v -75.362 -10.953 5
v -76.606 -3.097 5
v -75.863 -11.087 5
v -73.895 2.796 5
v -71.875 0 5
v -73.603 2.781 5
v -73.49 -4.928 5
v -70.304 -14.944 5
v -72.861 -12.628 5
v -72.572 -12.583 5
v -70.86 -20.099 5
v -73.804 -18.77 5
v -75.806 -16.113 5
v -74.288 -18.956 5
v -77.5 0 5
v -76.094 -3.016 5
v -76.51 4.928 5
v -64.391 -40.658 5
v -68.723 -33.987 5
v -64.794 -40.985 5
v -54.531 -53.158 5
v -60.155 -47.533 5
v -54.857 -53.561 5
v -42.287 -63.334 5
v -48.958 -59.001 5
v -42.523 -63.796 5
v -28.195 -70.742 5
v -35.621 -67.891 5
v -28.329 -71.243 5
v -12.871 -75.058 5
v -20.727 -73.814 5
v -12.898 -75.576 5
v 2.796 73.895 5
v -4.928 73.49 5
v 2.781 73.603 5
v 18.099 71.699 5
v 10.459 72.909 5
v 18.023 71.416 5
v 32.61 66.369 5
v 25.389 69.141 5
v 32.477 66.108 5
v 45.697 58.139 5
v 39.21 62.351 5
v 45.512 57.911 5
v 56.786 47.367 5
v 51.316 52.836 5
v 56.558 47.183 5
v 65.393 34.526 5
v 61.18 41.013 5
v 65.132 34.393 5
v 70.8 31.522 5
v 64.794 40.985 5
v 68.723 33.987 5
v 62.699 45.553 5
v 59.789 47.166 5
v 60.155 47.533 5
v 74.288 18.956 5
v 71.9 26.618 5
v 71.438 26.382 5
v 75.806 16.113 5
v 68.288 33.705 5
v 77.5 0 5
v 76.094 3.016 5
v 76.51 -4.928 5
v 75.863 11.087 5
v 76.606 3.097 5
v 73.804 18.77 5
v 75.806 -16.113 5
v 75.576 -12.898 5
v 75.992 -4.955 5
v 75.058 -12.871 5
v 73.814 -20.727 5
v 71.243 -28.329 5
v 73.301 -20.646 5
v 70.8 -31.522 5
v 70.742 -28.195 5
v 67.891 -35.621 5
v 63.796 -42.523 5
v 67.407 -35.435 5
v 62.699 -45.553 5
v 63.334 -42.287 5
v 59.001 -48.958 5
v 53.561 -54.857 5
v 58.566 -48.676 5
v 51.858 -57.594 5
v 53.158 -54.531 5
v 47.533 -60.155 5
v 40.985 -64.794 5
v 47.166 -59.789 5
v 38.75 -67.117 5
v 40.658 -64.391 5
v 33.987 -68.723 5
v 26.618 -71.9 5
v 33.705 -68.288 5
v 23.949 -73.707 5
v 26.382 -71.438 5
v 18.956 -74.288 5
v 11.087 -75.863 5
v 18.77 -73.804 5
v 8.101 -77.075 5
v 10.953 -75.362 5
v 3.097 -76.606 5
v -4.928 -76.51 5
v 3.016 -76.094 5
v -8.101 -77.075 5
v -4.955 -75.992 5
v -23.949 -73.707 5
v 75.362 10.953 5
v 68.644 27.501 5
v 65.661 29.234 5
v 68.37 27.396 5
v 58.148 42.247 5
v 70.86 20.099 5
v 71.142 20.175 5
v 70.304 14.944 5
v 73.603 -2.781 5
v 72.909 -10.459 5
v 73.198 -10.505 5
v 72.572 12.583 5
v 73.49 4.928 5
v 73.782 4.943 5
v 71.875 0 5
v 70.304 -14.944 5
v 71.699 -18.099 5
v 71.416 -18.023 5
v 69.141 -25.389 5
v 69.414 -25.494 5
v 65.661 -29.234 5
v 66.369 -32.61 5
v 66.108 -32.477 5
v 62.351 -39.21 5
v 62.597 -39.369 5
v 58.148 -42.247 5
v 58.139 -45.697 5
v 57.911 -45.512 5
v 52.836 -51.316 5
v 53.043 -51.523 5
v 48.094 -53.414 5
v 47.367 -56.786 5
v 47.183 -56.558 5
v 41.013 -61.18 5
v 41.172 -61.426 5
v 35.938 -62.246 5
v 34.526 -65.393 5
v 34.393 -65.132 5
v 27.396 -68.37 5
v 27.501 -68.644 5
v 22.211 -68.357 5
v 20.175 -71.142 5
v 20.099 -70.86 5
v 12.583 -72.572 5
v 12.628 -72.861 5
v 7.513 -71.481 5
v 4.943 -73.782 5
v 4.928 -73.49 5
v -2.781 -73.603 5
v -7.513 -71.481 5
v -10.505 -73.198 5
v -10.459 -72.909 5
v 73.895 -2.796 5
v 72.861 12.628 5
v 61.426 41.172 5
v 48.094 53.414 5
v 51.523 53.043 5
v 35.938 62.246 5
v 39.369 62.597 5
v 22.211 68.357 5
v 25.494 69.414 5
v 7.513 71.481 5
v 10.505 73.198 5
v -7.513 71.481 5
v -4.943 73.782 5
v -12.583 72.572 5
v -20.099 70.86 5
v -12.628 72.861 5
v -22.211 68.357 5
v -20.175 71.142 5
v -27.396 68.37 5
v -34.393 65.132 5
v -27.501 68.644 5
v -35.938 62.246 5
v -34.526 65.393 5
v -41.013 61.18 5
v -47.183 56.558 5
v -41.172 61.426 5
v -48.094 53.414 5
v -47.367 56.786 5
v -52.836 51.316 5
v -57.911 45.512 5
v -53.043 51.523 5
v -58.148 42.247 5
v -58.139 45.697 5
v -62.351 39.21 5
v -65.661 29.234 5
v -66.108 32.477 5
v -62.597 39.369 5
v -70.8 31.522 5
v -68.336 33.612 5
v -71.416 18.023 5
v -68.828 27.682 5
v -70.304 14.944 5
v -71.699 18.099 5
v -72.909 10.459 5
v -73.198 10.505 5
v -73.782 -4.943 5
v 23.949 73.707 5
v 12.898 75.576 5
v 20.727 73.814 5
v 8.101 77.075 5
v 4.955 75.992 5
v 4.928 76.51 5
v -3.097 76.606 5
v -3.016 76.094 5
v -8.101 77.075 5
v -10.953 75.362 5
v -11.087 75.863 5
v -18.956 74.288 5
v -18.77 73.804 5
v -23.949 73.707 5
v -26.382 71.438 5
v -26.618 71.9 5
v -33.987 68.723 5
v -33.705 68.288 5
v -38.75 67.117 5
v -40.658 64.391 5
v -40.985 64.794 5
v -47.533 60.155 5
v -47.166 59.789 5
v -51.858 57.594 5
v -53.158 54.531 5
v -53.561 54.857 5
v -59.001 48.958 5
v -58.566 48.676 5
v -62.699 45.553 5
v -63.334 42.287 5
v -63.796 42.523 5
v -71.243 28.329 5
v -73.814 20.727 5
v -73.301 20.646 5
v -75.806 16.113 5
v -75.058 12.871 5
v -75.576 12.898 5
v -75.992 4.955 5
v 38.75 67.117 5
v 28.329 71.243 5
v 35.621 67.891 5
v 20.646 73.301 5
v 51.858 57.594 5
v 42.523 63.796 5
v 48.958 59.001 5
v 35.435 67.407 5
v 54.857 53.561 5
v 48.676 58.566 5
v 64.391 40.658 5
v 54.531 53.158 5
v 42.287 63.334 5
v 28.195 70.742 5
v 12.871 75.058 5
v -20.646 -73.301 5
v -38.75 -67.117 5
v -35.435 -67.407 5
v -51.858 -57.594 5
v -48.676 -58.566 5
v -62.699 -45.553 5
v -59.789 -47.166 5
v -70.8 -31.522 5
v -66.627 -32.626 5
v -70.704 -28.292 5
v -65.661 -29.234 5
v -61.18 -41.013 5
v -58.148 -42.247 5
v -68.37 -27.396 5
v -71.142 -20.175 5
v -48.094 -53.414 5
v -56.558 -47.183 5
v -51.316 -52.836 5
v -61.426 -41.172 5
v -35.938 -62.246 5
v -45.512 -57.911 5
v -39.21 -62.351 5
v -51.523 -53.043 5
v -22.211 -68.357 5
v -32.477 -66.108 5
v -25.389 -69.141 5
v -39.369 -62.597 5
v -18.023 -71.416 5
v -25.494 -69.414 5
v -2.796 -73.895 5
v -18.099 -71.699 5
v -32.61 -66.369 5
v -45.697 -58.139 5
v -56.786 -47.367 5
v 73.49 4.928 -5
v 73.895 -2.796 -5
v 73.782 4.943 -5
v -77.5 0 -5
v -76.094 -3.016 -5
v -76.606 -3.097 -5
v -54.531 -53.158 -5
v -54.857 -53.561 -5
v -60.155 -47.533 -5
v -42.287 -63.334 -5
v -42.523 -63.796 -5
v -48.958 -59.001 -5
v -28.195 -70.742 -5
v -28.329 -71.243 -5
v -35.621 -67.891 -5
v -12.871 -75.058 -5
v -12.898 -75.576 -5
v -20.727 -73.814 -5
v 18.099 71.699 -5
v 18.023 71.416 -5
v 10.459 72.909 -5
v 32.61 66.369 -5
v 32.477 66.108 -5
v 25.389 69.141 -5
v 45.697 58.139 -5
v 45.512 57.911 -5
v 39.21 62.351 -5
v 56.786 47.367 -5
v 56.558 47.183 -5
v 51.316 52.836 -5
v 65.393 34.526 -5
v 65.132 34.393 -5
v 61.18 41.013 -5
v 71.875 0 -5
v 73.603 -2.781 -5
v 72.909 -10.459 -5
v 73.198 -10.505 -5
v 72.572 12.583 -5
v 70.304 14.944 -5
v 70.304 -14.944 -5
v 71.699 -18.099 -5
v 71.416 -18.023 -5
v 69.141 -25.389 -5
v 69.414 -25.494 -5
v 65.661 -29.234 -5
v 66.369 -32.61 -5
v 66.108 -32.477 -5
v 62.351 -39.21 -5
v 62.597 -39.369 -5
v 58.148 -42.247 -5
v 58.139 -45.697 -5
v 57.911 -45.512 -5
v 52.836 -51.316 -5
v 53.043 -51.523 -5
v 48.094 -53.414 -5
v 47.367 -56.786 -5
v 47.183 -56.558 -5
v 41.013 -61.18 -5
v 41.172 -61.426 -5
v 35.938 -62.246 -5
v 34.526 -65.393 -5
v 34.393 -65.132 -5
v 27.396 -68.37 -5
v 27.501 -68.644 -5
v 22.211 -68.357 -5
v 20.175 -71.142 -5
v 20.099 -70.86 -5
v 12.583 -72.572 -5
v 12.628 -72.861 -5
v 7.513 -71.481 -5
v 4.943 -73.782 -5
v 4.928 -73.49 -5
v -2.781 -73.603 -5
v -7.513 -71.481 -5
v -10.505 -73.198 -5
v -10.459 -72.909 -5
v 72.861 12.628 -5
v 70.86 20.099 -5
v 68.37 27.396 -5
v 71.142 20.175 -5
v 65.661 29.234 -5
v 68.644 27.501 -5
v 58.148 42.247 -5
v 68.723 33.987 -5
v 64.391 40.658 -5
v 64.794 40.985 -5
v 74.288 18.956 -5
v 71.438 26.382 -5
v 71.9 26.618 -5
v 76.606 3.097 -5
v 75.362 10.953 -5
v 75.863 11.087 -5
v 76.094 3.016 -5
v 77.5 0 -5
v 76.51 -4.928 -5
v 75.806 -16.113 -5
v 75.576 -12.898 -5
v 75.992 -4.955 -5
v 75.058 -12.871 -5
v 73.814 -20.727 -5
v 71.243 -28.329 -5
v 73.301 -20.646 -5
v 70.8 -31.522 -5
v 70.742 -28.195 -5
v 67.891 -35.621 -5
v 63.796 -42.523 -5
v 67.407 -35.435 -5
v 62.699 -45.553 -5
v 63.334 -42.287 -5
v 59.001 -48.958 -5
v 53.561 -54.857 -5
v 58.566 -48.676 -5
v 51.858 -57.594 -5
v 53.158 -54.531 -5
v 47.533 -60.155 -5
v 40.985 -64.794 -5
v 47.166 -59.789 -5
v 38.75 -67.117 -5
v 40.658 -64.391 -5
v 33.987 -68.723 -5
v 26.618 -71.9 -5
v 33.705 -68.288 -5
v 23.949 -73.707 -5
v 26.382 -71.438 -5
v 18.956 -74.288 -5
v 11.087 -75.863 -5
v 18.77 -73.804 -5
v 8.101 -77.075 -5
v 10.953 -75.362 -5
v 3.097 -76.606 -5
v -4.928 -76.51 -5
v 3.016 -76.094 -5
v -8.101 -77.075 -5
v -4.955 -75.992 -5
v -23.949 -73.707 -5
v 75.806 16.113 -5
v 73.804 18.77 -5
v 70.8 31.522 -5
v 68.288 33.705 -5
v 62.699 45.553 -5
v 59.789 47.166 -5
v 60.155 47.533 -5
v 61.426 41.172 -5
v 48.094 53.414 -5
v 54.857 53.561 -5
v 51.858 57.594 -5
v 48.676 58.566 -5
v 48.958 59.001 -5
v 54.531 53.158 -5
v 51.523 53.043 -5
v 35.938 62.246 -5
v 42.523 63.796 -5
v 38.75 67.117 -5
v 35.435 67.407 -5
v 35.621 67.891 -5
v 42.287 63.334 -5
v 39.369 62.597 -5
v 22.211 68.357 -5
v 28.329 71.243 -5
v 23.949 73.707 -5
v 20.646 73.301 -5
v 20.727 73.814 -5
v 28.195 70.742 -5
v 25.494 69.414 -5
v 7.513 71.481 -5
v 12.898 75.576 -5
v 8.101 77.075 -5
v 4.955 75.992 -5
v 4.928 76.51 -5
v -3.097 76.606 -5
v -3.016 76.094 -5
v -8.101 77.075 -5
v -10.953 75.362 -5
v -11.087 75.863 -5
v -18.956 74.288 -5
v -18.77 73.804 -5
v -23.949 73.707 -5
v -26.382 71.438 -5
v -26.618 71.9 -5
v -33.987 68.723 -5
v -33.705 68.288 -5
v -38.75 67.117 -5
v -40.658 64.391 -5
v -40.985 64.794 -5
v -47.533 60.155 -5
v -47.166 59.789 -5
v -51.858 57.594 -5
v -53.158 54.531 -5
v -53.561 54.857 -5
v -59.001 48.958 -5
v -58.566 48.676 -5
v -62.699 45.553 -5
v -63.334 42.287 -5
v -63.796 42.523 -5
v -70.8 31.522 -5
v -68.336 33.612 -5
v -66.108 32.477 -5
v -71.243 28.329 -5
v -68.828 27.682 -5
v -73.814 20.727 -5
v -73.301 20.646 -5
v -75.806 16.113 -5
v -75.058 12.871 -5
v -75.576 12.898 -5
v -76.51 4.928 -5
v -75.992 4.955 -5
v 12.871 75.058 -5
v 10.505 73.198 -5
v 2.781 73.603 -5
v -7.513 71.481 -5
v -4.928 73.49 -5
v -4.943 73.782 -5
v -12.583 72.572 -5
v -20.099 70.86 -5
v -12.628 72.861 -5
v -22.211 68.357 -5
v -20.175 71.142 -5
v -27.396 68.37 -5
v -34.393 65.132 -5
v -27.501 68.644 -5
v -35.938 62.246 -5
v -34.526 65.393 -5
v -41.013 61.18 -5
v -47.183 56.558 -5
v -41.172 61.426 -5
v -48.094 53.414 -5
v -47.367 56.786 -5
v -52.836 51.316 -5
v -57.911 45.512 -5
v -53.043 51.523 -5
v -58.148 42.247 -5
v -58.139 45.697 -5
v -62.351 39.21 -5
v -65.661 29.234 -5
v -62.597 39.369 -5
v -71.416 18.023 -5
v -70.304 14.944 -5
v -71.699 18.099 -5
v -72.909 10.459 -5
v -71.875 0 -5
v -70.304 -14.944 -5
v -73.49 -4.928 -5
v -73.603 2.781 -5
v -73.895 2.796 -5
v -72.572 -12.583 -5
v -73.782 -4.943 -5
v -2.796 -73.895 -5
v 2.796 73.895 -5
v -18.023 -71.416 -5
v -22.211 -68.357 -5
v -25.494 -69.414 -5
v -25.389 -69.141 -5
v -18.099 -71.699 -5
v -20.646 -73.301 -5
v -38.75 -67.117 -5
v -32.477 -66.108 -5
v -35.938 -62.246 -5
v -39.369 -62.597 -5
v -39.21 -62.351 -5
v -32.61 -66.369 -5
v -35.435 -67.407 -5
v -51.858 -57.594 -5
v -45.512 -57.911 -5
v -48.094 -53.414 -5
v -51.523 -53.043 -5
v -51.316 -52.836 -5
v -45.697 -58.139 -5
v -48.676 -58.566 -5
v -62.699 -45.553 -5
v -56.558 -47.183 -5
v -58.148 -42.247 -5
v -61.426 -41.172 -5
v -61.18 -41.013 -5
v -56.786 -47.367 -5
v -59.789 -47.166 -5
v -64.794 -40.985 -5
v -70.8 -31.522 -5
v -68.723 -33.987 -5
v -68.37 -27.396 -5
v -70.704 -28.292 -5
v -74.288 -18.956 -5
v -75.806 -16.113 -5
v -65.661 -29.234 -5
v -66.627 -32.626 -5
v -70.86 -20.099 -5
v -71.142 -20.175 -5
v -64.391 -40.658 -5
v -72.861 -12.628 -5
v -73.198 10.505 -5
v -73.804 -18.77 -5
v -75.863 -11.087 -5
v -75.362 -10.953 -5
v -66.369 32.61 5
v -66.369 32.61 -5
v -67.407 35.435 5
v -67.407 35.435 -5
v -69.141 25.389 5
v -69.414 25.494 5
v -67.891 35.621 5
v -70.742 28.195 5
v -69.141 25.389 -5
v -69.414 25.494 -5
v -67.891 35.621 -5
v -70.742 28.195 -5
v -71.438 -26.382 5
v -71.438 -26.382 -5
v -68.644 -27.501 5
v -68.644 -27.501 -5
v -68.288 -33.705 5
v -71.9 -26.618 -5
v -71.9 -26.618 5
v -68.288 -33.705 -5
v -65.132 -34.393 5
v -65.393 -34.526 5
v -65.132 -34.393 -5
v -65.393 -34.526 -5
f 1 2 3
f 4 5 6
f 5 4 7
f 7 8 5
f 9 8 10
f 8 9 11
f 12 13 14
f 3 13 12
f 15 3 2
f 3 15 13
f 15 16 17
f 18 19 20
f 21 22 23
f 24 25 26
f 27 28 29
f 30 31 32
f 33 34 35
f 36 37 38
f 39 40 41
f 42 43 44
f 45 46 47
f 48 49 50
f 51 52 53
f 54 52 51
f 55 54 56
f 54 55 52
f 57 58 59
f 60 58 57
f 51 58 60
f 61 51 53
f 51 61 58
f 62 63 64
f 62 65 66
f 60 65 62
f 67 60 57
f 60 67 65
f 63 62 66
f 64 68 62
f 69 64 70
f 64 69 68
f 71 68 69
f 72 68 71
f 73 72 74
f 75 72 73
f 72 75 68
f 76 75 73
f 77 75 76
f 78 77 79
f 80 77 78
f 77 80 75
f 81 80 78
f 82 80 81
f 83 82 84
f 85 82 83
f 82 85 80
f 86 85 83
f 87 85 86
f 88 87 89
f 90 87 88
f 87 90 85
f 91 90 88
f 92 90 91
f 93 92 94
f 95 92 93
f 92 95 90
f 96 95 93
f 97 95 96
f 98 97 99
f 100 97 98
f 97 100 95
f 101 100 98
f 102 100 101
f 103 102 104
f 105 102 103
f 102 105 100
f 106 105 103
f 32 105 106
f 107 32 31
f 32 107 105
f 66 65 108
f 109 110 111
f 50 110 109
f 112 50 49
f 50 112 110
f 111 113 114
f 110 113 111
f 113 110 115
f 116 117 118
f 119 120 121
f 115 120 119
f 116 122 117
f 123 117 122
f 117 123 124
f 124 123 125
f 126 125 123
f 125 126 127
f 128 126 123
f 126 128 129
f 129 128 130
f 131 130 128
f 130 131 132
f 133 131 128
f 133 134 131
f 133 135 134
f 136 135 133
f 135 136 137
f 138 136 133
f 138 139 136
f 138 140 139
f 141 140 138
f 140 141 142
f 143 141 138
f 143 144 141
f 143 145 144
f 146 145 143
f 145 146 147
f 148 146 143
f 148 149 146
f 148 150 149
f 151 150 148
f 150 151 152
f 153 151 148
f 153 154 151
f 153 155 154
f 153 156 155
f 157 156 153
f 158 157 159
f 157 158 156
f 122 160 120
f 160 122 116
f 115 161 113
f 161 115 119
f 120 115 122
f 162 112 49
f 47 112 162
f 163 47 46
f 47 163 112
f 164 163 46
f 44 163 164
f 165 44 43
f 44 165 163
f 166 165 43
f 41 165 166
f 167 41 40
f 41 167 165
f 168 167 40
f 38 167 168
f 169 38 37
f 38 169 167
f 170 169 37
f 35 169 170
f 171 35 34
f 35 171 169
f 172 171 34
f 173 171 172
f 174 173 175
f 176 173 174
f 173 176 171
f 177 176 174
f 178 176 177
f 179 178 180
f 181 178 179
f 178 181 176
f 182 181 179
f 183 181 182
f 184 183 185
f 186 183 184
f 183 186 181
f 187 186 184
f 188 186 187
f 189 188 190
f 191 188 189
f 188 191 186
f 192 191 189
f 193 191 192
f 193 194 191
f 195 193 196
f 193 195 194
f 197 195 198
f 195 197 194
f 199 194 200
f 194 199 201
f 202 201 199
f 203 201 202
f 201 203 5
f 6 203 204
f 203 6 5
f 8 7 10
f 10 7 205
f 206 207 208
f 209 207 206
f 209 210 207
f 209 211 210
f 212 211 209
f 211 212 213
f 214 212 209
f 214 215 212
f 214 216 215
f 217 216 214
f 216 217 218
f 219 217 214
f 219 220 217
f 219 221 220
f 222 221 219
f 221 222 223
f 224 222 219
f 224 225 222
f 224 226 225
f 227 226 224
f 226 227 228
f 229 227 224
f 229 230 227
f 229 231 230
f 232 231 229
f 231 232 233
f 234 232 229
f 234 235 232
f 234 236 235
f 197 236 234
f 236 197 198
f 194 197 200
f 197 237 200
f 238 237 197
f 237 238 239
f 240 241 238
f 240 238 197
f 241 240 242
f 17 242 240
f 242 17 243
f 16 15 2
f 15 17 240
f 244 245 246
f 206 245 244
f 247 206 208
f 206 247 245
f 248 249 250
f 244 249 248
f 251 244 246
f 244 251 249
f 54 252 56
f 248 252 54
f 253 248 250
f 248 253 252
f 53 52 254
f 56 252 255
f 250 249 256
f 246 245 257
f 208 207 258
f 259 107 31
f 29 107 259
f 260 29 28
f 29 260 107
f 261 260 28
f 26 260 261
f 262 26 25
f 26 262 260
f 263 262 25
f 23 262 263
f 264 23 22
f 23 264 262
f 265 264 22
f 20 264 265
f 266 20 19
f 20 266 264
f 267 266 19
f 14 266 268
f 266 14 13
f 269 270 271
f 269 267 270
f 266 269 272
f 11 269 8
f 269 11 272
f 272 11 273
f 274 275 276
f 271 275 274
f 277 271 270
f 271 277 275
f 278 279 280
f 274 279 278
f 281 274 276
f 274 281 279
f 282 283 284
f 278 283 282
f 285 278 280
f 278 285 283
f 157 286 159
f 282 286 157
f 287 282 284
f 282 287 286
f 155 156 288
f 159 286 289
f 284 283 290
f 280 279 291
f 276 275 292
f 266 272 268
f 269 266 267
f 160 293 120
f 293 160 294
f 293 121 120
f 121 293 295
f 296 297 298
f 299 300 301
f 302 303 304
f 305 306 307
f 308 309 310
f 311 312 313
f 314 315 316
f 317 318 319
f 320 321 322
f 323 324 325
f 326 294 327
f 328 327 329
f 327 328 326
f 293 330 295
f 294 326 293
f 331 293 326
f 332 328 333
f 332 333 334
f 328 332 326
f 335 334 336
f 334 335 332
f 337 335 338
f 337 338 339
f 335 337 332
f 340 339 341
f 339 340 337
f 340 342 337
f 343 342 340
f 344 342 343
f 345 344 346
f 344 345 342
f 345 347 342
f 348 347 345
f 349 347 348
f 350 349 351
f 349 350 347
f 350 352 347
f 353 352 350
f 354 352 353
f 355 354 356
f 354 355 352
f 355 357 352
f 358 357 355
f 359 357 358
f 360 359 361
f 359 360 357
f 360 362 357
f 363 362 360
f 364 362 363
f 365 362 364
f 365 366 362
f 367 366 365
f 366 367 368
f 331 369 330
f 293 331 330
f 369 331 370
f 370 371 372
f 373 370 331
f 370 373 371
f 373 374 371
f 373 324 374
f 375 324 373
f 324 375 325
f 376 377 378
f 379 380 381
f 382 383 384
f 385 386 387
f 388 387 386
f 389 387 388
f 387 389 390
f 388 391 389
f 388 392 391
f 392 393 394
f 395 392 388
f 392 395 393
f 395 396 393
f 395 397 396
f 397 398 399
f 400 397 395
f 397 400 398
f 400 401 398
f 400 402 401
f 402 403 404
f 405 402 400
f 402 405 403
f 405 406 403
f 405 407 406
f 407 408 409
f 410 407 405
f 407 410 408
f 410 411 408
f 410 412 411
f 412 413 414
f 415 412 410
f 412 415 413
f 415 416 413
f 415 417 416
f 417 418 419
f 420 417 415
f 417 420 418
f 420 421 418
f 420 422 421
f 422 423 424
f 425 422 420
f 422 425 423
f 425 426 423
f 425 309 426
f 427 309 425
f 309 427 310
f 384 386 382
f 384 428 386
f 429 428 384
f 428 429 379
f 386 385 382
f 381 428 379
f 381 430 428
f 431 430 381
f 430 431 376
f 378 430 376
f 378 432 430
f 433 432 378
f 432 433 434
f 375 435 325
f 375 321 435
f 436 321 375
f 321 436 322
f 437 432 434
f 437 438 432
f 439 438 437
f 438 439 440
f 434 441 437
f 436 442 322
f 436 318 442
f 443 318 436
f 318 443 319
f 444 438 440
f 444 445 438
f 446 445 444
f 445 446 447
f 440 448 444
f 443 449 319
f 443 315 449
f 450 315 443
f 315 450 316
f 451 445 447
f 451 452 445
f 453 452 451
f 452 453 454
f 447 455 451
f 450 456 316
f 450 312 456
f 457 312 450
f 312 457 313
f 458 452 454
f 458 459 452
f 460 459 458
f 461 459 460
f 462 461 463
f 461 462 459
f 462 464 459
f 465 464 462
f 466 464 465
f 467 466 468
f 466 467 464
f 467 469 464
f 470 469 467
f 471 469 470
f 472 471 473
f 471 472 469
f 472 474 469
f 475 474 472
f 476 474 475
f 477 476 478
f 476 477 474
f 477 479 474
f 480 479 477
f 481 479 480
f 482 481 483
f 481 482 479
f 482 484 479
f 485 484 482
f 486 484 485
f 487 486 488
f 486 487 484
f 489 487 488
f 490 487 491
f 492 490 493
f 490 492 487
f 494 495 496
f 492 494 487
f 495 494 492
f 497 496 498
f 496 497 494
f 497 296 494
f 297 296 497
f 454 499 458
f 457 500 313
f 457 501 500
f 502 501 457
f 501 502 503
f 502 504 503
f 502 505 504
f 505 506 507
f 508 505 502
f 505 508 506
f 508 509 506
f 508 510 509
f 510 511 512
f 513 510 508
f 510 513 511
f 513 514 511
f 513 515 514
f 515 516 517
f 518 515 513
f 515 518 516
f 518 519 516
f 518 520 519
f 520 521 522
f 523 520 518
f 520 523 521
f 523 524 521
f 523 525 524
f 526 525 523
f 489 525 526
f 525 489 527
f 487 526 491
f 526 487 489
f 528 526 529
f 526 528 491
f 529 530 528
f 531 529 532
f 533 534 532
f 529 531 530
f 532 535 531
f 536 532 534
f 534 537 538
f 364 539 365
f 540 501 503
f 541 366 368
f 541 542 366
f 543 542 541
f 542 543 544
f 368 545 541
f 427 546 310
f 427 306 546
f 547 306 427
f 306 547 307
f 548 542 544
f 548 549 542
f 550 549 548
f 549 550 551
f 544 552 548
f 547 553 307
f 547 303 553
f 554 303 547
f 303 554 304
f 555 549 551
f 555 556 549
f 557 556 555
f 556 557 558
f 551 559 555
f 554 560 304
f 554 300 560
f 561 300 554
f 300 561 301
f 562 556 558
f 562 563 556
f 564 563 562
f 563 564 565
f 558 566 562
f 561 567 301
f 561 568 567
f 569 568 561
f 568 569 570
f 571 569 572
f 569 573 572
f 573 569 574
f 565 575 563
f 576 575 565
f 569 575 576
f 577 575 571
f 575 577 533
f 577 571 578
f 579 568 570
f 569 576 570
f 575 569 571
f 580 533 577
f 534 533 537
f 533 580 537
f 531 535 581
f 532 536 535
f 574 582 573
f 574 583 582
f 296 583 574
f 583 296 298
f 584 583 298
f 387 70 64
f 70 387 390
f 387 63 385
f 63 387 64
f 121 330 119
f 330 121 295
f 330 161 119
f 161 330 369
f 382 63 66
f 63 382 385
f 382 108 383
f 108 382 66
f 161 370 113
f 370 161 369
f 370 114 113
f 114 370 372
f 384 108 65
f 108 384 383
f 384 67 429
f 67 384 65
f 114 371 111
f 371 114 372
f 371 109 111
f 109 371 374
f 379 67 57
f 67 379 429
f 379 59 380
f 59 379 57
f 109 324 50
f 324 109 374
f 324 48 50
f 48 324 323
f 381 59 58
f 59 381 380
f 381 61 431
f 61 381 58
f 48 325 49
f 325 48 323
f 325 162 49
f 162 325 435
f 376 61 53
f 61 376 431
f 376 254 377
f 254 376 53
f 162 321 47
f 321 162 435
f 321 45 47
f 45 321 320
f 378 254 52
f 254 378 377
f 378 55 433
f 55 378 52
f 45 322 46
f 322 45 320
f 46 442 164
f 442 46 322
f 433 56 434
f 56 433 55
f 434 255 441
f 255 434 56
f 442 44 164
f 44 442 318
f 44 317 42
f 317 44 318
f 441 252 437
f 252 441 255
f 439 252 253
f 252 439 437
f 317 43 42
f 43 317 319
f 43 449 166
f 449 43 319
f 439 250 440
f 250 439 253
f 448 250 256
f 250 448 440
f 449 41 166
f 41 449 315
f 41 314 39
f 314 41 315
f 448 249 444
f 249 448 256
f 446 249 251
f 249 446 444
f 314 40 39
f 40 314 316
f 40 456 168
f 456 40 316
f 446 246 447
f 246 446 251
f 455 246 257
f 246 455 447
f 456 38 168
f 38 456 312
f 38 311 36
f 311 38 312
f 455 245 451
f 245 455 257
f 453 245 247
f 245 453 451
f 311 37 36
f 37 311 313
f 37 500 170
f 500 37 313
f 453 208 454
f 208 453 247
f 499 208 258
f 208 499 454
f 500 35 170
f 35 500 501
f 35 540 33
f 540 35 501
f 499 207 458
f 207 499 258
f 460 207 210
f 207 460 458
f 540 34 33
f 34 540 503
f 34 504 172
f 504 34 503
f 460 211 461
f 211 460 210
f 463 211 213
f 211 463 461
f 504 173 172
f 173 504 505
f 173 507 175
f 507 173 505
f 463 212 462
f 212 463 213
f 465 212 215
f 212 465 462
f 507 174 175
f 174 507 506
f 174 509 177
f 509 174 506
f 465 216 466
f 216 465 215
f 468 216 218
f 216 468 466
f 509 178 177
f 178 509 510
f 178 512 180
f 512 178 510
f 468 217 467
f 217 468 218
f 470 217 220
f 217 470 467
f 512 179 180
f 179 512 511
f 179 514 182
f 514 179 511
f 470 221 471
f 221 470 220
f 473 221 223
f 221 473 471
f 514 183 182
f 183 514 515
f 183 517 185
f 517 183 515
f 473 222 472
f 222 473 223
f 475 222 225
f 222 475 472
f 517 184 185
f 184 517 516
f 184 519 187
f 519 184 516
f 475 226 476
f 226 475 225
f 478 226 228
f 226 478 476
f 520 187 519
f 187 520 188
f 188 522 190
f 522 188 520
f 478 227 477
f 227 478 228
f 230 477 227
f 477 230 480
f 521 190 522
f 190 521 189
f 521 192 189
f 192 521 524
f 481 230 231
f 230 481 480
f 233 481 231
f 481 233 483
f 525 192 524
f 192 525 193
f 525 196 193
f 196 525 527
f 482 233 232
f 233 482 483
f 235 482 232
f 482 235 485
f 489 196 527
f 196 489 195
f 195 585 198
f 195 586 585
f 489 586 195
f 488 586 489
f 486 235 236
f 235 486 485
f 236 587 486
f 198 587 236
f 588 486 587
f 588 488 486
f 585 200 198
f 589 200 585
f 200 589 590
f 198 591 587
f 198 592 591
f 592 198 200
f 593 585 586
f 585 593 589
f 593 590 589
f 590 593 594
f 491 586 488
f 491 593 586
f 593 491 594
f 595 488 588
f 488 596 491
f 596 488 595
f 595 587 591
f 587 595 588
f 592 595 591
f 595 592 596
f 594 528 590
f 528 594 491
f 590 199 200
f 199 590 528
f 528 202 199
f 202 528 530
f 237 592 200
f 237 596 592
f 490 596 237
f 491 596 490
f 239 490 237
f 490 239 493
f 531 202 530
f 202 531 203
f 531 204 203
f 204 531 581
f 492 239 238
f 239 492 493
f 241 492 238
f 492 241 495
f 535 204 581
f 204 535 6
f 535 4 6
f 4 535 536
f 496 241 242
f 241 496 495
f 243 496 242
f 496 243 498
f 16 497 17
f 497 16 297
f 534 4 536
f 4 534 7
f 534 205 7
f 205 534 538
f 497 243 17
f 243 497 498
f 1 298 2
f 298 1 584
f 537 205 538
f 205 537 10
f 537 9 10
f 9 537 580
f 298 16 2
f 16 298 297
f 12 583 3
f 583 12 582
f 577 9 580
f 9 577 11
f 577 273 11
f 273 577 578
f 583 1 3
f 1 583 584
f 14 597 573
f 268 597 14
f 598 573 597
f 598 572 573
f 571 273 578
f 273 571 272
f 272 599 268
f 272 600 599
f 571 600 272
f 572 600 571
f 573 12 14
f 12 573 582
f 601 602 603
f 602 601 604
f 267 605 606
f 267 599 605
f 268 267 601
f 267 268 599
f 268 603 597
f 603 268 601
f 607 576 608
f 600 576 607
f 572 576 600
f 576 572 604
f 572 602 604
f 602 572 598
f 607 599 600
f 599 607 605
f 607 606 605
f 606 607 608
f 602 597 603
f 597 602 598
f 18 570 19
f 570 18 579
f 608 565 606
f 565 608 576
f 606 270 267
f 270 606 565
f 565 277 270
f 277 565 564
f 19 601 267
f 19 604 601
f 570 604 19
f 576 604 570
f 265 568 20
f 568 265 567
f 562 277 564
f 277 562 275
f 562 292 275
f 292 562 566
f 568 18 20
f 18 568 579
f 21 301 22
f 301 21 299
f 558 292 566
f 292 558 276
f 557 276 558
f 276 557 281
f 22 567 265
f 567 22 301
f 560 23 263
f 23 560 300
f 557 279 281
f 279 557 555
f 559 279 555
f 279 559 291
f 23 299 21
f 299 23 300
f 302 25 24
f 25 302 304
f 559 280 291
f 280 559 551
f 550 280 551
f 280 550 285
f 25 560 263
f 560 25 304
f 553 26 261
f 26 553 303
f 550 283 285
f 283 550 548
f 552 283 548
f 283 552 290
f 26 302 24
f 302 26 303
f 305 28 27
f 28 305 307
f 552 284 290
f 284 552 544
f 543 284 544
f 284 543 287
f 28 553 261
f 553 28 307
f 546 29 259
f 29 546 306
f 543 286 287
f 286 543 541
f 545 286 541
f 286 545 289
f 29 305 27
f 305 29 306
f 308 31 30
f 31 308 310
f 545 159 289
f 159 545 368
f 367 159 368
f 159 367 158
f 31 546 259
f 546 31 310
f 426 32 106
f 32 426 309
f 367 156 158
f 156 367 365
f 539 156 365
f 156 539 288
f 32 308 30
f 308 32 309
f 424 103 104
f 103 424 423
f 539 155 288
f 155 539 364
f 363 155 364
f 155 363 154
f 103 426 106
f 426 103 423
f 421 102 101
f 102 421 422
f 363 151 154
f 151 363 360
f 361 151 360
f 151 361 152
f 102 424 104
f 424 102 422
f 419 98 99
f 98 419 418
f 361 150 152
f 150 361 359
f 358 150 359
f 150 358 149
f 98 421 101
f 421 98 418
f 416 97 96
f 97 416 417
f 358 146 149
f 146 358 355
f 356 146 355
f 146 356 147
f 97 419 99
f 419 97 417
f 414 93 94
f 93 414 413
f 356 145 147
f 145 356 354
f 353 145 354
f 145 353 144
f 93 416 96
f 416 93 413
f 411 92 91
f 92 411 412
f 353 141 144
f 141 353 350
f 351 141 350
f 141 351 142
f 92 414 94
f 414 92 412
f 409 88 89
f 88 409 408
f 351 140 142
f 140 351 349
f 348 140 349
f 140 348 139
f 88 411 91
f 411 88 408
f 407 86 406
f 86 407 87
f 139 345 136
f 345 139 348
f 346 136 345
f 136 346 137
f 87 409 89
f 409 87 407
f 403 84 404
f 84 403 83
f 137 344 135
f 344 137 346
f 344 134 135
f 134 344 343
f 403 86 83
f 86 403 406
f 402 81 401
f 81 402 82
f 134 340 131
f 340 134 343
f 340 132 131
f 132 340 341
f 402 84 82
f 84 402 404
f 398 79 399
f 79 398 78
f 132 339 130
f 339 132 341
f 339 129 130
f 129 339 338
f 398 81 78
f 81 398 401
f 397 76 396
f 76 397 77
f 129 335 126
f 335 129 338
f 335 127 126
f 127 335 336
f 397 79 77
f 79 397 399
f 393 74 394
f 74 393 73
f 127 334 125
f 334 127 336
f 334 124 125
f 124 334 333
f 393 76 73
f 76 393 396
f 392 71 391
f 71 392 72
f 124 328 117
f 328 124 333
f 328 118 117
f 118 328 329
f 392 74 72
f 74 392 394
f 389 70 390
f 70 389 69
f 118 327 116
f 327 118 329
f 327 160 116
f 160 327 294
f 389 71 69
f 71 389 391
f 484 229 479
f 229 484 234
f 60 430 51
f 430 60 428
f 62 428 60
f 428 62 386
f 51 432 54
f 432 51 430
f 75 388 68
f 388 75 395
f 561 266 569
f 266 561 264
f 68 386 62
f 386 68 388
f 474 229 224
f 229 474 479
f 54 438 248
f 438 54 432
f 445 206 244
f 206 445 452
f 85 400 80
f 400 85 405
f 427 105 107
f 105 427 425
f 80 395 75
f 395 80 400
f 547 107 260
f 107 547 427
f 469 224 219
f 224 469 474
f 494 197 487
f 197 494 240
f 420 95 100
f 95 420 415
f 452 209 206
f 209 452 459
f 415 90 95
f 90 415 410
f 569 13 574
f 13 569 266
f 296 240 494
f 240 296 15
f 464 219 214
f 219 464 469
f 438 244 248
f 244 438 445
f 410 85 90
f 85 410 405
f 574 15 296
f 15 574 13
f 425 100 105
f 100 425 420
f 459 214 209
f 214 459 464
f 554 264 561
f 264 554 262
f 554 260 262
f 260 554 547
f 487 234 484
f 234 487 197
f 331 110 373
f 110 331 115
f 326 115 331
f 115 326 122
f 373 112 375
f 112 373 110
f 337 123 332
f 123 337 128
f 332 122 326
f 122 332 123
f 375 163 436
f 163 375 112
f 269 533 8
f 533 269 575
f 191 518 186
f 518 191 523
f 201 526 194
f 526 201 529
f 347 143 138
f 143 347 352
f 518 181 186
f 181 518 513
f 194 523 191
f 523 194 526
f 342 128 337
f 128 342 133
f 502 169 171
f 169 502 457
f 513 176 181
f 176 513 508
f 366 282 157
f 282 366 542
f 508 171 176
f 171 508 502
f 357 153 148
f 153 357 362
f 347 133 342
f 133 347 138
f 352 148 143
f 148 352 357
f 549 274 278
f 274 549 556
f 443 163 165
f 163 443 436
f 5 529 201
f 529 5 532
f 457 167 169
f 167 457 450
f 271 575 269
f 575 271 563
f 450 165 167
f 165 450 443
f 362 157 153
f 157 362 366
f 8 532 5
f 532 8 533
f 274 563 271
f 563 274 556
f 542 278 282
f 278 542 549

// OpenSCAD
module_mm = 2.5;
thickness = 10;
num_teeth = 60;
dedendum_factor = 1.25;
clearance = 0.2;

addendum = module_mm;
dedendum = module_mm * dedendum_factor;
pitch_diameter = num_teeth * module_mm;
outer_diameter = pitch_diameter + 2 * addendum;
root_diameter = pitch_diameter - 2 * dedendum;
tooth_angle = 360 / num_teeth;

function deg2rad(degrees) = degrees * (PI / 180);

module gear() {
    difference() {
        cylinder(h = thickness, d = outer_diameter, center = true);
        cylinder(h = thickness + 1, d = root_diameter, center = true);
        for (i = [0 : num_teeth - 1]) {
            rotate(i * tooth_angle) {
                translate([pitch_diameter / 2, 0, 0]) {
                    rotate([0, 0, tooth_angle / 2]) {
                        cube([addendum, thickness, thickness], center = true);
                    }
                }
            }
        }
    }
}

gear();
